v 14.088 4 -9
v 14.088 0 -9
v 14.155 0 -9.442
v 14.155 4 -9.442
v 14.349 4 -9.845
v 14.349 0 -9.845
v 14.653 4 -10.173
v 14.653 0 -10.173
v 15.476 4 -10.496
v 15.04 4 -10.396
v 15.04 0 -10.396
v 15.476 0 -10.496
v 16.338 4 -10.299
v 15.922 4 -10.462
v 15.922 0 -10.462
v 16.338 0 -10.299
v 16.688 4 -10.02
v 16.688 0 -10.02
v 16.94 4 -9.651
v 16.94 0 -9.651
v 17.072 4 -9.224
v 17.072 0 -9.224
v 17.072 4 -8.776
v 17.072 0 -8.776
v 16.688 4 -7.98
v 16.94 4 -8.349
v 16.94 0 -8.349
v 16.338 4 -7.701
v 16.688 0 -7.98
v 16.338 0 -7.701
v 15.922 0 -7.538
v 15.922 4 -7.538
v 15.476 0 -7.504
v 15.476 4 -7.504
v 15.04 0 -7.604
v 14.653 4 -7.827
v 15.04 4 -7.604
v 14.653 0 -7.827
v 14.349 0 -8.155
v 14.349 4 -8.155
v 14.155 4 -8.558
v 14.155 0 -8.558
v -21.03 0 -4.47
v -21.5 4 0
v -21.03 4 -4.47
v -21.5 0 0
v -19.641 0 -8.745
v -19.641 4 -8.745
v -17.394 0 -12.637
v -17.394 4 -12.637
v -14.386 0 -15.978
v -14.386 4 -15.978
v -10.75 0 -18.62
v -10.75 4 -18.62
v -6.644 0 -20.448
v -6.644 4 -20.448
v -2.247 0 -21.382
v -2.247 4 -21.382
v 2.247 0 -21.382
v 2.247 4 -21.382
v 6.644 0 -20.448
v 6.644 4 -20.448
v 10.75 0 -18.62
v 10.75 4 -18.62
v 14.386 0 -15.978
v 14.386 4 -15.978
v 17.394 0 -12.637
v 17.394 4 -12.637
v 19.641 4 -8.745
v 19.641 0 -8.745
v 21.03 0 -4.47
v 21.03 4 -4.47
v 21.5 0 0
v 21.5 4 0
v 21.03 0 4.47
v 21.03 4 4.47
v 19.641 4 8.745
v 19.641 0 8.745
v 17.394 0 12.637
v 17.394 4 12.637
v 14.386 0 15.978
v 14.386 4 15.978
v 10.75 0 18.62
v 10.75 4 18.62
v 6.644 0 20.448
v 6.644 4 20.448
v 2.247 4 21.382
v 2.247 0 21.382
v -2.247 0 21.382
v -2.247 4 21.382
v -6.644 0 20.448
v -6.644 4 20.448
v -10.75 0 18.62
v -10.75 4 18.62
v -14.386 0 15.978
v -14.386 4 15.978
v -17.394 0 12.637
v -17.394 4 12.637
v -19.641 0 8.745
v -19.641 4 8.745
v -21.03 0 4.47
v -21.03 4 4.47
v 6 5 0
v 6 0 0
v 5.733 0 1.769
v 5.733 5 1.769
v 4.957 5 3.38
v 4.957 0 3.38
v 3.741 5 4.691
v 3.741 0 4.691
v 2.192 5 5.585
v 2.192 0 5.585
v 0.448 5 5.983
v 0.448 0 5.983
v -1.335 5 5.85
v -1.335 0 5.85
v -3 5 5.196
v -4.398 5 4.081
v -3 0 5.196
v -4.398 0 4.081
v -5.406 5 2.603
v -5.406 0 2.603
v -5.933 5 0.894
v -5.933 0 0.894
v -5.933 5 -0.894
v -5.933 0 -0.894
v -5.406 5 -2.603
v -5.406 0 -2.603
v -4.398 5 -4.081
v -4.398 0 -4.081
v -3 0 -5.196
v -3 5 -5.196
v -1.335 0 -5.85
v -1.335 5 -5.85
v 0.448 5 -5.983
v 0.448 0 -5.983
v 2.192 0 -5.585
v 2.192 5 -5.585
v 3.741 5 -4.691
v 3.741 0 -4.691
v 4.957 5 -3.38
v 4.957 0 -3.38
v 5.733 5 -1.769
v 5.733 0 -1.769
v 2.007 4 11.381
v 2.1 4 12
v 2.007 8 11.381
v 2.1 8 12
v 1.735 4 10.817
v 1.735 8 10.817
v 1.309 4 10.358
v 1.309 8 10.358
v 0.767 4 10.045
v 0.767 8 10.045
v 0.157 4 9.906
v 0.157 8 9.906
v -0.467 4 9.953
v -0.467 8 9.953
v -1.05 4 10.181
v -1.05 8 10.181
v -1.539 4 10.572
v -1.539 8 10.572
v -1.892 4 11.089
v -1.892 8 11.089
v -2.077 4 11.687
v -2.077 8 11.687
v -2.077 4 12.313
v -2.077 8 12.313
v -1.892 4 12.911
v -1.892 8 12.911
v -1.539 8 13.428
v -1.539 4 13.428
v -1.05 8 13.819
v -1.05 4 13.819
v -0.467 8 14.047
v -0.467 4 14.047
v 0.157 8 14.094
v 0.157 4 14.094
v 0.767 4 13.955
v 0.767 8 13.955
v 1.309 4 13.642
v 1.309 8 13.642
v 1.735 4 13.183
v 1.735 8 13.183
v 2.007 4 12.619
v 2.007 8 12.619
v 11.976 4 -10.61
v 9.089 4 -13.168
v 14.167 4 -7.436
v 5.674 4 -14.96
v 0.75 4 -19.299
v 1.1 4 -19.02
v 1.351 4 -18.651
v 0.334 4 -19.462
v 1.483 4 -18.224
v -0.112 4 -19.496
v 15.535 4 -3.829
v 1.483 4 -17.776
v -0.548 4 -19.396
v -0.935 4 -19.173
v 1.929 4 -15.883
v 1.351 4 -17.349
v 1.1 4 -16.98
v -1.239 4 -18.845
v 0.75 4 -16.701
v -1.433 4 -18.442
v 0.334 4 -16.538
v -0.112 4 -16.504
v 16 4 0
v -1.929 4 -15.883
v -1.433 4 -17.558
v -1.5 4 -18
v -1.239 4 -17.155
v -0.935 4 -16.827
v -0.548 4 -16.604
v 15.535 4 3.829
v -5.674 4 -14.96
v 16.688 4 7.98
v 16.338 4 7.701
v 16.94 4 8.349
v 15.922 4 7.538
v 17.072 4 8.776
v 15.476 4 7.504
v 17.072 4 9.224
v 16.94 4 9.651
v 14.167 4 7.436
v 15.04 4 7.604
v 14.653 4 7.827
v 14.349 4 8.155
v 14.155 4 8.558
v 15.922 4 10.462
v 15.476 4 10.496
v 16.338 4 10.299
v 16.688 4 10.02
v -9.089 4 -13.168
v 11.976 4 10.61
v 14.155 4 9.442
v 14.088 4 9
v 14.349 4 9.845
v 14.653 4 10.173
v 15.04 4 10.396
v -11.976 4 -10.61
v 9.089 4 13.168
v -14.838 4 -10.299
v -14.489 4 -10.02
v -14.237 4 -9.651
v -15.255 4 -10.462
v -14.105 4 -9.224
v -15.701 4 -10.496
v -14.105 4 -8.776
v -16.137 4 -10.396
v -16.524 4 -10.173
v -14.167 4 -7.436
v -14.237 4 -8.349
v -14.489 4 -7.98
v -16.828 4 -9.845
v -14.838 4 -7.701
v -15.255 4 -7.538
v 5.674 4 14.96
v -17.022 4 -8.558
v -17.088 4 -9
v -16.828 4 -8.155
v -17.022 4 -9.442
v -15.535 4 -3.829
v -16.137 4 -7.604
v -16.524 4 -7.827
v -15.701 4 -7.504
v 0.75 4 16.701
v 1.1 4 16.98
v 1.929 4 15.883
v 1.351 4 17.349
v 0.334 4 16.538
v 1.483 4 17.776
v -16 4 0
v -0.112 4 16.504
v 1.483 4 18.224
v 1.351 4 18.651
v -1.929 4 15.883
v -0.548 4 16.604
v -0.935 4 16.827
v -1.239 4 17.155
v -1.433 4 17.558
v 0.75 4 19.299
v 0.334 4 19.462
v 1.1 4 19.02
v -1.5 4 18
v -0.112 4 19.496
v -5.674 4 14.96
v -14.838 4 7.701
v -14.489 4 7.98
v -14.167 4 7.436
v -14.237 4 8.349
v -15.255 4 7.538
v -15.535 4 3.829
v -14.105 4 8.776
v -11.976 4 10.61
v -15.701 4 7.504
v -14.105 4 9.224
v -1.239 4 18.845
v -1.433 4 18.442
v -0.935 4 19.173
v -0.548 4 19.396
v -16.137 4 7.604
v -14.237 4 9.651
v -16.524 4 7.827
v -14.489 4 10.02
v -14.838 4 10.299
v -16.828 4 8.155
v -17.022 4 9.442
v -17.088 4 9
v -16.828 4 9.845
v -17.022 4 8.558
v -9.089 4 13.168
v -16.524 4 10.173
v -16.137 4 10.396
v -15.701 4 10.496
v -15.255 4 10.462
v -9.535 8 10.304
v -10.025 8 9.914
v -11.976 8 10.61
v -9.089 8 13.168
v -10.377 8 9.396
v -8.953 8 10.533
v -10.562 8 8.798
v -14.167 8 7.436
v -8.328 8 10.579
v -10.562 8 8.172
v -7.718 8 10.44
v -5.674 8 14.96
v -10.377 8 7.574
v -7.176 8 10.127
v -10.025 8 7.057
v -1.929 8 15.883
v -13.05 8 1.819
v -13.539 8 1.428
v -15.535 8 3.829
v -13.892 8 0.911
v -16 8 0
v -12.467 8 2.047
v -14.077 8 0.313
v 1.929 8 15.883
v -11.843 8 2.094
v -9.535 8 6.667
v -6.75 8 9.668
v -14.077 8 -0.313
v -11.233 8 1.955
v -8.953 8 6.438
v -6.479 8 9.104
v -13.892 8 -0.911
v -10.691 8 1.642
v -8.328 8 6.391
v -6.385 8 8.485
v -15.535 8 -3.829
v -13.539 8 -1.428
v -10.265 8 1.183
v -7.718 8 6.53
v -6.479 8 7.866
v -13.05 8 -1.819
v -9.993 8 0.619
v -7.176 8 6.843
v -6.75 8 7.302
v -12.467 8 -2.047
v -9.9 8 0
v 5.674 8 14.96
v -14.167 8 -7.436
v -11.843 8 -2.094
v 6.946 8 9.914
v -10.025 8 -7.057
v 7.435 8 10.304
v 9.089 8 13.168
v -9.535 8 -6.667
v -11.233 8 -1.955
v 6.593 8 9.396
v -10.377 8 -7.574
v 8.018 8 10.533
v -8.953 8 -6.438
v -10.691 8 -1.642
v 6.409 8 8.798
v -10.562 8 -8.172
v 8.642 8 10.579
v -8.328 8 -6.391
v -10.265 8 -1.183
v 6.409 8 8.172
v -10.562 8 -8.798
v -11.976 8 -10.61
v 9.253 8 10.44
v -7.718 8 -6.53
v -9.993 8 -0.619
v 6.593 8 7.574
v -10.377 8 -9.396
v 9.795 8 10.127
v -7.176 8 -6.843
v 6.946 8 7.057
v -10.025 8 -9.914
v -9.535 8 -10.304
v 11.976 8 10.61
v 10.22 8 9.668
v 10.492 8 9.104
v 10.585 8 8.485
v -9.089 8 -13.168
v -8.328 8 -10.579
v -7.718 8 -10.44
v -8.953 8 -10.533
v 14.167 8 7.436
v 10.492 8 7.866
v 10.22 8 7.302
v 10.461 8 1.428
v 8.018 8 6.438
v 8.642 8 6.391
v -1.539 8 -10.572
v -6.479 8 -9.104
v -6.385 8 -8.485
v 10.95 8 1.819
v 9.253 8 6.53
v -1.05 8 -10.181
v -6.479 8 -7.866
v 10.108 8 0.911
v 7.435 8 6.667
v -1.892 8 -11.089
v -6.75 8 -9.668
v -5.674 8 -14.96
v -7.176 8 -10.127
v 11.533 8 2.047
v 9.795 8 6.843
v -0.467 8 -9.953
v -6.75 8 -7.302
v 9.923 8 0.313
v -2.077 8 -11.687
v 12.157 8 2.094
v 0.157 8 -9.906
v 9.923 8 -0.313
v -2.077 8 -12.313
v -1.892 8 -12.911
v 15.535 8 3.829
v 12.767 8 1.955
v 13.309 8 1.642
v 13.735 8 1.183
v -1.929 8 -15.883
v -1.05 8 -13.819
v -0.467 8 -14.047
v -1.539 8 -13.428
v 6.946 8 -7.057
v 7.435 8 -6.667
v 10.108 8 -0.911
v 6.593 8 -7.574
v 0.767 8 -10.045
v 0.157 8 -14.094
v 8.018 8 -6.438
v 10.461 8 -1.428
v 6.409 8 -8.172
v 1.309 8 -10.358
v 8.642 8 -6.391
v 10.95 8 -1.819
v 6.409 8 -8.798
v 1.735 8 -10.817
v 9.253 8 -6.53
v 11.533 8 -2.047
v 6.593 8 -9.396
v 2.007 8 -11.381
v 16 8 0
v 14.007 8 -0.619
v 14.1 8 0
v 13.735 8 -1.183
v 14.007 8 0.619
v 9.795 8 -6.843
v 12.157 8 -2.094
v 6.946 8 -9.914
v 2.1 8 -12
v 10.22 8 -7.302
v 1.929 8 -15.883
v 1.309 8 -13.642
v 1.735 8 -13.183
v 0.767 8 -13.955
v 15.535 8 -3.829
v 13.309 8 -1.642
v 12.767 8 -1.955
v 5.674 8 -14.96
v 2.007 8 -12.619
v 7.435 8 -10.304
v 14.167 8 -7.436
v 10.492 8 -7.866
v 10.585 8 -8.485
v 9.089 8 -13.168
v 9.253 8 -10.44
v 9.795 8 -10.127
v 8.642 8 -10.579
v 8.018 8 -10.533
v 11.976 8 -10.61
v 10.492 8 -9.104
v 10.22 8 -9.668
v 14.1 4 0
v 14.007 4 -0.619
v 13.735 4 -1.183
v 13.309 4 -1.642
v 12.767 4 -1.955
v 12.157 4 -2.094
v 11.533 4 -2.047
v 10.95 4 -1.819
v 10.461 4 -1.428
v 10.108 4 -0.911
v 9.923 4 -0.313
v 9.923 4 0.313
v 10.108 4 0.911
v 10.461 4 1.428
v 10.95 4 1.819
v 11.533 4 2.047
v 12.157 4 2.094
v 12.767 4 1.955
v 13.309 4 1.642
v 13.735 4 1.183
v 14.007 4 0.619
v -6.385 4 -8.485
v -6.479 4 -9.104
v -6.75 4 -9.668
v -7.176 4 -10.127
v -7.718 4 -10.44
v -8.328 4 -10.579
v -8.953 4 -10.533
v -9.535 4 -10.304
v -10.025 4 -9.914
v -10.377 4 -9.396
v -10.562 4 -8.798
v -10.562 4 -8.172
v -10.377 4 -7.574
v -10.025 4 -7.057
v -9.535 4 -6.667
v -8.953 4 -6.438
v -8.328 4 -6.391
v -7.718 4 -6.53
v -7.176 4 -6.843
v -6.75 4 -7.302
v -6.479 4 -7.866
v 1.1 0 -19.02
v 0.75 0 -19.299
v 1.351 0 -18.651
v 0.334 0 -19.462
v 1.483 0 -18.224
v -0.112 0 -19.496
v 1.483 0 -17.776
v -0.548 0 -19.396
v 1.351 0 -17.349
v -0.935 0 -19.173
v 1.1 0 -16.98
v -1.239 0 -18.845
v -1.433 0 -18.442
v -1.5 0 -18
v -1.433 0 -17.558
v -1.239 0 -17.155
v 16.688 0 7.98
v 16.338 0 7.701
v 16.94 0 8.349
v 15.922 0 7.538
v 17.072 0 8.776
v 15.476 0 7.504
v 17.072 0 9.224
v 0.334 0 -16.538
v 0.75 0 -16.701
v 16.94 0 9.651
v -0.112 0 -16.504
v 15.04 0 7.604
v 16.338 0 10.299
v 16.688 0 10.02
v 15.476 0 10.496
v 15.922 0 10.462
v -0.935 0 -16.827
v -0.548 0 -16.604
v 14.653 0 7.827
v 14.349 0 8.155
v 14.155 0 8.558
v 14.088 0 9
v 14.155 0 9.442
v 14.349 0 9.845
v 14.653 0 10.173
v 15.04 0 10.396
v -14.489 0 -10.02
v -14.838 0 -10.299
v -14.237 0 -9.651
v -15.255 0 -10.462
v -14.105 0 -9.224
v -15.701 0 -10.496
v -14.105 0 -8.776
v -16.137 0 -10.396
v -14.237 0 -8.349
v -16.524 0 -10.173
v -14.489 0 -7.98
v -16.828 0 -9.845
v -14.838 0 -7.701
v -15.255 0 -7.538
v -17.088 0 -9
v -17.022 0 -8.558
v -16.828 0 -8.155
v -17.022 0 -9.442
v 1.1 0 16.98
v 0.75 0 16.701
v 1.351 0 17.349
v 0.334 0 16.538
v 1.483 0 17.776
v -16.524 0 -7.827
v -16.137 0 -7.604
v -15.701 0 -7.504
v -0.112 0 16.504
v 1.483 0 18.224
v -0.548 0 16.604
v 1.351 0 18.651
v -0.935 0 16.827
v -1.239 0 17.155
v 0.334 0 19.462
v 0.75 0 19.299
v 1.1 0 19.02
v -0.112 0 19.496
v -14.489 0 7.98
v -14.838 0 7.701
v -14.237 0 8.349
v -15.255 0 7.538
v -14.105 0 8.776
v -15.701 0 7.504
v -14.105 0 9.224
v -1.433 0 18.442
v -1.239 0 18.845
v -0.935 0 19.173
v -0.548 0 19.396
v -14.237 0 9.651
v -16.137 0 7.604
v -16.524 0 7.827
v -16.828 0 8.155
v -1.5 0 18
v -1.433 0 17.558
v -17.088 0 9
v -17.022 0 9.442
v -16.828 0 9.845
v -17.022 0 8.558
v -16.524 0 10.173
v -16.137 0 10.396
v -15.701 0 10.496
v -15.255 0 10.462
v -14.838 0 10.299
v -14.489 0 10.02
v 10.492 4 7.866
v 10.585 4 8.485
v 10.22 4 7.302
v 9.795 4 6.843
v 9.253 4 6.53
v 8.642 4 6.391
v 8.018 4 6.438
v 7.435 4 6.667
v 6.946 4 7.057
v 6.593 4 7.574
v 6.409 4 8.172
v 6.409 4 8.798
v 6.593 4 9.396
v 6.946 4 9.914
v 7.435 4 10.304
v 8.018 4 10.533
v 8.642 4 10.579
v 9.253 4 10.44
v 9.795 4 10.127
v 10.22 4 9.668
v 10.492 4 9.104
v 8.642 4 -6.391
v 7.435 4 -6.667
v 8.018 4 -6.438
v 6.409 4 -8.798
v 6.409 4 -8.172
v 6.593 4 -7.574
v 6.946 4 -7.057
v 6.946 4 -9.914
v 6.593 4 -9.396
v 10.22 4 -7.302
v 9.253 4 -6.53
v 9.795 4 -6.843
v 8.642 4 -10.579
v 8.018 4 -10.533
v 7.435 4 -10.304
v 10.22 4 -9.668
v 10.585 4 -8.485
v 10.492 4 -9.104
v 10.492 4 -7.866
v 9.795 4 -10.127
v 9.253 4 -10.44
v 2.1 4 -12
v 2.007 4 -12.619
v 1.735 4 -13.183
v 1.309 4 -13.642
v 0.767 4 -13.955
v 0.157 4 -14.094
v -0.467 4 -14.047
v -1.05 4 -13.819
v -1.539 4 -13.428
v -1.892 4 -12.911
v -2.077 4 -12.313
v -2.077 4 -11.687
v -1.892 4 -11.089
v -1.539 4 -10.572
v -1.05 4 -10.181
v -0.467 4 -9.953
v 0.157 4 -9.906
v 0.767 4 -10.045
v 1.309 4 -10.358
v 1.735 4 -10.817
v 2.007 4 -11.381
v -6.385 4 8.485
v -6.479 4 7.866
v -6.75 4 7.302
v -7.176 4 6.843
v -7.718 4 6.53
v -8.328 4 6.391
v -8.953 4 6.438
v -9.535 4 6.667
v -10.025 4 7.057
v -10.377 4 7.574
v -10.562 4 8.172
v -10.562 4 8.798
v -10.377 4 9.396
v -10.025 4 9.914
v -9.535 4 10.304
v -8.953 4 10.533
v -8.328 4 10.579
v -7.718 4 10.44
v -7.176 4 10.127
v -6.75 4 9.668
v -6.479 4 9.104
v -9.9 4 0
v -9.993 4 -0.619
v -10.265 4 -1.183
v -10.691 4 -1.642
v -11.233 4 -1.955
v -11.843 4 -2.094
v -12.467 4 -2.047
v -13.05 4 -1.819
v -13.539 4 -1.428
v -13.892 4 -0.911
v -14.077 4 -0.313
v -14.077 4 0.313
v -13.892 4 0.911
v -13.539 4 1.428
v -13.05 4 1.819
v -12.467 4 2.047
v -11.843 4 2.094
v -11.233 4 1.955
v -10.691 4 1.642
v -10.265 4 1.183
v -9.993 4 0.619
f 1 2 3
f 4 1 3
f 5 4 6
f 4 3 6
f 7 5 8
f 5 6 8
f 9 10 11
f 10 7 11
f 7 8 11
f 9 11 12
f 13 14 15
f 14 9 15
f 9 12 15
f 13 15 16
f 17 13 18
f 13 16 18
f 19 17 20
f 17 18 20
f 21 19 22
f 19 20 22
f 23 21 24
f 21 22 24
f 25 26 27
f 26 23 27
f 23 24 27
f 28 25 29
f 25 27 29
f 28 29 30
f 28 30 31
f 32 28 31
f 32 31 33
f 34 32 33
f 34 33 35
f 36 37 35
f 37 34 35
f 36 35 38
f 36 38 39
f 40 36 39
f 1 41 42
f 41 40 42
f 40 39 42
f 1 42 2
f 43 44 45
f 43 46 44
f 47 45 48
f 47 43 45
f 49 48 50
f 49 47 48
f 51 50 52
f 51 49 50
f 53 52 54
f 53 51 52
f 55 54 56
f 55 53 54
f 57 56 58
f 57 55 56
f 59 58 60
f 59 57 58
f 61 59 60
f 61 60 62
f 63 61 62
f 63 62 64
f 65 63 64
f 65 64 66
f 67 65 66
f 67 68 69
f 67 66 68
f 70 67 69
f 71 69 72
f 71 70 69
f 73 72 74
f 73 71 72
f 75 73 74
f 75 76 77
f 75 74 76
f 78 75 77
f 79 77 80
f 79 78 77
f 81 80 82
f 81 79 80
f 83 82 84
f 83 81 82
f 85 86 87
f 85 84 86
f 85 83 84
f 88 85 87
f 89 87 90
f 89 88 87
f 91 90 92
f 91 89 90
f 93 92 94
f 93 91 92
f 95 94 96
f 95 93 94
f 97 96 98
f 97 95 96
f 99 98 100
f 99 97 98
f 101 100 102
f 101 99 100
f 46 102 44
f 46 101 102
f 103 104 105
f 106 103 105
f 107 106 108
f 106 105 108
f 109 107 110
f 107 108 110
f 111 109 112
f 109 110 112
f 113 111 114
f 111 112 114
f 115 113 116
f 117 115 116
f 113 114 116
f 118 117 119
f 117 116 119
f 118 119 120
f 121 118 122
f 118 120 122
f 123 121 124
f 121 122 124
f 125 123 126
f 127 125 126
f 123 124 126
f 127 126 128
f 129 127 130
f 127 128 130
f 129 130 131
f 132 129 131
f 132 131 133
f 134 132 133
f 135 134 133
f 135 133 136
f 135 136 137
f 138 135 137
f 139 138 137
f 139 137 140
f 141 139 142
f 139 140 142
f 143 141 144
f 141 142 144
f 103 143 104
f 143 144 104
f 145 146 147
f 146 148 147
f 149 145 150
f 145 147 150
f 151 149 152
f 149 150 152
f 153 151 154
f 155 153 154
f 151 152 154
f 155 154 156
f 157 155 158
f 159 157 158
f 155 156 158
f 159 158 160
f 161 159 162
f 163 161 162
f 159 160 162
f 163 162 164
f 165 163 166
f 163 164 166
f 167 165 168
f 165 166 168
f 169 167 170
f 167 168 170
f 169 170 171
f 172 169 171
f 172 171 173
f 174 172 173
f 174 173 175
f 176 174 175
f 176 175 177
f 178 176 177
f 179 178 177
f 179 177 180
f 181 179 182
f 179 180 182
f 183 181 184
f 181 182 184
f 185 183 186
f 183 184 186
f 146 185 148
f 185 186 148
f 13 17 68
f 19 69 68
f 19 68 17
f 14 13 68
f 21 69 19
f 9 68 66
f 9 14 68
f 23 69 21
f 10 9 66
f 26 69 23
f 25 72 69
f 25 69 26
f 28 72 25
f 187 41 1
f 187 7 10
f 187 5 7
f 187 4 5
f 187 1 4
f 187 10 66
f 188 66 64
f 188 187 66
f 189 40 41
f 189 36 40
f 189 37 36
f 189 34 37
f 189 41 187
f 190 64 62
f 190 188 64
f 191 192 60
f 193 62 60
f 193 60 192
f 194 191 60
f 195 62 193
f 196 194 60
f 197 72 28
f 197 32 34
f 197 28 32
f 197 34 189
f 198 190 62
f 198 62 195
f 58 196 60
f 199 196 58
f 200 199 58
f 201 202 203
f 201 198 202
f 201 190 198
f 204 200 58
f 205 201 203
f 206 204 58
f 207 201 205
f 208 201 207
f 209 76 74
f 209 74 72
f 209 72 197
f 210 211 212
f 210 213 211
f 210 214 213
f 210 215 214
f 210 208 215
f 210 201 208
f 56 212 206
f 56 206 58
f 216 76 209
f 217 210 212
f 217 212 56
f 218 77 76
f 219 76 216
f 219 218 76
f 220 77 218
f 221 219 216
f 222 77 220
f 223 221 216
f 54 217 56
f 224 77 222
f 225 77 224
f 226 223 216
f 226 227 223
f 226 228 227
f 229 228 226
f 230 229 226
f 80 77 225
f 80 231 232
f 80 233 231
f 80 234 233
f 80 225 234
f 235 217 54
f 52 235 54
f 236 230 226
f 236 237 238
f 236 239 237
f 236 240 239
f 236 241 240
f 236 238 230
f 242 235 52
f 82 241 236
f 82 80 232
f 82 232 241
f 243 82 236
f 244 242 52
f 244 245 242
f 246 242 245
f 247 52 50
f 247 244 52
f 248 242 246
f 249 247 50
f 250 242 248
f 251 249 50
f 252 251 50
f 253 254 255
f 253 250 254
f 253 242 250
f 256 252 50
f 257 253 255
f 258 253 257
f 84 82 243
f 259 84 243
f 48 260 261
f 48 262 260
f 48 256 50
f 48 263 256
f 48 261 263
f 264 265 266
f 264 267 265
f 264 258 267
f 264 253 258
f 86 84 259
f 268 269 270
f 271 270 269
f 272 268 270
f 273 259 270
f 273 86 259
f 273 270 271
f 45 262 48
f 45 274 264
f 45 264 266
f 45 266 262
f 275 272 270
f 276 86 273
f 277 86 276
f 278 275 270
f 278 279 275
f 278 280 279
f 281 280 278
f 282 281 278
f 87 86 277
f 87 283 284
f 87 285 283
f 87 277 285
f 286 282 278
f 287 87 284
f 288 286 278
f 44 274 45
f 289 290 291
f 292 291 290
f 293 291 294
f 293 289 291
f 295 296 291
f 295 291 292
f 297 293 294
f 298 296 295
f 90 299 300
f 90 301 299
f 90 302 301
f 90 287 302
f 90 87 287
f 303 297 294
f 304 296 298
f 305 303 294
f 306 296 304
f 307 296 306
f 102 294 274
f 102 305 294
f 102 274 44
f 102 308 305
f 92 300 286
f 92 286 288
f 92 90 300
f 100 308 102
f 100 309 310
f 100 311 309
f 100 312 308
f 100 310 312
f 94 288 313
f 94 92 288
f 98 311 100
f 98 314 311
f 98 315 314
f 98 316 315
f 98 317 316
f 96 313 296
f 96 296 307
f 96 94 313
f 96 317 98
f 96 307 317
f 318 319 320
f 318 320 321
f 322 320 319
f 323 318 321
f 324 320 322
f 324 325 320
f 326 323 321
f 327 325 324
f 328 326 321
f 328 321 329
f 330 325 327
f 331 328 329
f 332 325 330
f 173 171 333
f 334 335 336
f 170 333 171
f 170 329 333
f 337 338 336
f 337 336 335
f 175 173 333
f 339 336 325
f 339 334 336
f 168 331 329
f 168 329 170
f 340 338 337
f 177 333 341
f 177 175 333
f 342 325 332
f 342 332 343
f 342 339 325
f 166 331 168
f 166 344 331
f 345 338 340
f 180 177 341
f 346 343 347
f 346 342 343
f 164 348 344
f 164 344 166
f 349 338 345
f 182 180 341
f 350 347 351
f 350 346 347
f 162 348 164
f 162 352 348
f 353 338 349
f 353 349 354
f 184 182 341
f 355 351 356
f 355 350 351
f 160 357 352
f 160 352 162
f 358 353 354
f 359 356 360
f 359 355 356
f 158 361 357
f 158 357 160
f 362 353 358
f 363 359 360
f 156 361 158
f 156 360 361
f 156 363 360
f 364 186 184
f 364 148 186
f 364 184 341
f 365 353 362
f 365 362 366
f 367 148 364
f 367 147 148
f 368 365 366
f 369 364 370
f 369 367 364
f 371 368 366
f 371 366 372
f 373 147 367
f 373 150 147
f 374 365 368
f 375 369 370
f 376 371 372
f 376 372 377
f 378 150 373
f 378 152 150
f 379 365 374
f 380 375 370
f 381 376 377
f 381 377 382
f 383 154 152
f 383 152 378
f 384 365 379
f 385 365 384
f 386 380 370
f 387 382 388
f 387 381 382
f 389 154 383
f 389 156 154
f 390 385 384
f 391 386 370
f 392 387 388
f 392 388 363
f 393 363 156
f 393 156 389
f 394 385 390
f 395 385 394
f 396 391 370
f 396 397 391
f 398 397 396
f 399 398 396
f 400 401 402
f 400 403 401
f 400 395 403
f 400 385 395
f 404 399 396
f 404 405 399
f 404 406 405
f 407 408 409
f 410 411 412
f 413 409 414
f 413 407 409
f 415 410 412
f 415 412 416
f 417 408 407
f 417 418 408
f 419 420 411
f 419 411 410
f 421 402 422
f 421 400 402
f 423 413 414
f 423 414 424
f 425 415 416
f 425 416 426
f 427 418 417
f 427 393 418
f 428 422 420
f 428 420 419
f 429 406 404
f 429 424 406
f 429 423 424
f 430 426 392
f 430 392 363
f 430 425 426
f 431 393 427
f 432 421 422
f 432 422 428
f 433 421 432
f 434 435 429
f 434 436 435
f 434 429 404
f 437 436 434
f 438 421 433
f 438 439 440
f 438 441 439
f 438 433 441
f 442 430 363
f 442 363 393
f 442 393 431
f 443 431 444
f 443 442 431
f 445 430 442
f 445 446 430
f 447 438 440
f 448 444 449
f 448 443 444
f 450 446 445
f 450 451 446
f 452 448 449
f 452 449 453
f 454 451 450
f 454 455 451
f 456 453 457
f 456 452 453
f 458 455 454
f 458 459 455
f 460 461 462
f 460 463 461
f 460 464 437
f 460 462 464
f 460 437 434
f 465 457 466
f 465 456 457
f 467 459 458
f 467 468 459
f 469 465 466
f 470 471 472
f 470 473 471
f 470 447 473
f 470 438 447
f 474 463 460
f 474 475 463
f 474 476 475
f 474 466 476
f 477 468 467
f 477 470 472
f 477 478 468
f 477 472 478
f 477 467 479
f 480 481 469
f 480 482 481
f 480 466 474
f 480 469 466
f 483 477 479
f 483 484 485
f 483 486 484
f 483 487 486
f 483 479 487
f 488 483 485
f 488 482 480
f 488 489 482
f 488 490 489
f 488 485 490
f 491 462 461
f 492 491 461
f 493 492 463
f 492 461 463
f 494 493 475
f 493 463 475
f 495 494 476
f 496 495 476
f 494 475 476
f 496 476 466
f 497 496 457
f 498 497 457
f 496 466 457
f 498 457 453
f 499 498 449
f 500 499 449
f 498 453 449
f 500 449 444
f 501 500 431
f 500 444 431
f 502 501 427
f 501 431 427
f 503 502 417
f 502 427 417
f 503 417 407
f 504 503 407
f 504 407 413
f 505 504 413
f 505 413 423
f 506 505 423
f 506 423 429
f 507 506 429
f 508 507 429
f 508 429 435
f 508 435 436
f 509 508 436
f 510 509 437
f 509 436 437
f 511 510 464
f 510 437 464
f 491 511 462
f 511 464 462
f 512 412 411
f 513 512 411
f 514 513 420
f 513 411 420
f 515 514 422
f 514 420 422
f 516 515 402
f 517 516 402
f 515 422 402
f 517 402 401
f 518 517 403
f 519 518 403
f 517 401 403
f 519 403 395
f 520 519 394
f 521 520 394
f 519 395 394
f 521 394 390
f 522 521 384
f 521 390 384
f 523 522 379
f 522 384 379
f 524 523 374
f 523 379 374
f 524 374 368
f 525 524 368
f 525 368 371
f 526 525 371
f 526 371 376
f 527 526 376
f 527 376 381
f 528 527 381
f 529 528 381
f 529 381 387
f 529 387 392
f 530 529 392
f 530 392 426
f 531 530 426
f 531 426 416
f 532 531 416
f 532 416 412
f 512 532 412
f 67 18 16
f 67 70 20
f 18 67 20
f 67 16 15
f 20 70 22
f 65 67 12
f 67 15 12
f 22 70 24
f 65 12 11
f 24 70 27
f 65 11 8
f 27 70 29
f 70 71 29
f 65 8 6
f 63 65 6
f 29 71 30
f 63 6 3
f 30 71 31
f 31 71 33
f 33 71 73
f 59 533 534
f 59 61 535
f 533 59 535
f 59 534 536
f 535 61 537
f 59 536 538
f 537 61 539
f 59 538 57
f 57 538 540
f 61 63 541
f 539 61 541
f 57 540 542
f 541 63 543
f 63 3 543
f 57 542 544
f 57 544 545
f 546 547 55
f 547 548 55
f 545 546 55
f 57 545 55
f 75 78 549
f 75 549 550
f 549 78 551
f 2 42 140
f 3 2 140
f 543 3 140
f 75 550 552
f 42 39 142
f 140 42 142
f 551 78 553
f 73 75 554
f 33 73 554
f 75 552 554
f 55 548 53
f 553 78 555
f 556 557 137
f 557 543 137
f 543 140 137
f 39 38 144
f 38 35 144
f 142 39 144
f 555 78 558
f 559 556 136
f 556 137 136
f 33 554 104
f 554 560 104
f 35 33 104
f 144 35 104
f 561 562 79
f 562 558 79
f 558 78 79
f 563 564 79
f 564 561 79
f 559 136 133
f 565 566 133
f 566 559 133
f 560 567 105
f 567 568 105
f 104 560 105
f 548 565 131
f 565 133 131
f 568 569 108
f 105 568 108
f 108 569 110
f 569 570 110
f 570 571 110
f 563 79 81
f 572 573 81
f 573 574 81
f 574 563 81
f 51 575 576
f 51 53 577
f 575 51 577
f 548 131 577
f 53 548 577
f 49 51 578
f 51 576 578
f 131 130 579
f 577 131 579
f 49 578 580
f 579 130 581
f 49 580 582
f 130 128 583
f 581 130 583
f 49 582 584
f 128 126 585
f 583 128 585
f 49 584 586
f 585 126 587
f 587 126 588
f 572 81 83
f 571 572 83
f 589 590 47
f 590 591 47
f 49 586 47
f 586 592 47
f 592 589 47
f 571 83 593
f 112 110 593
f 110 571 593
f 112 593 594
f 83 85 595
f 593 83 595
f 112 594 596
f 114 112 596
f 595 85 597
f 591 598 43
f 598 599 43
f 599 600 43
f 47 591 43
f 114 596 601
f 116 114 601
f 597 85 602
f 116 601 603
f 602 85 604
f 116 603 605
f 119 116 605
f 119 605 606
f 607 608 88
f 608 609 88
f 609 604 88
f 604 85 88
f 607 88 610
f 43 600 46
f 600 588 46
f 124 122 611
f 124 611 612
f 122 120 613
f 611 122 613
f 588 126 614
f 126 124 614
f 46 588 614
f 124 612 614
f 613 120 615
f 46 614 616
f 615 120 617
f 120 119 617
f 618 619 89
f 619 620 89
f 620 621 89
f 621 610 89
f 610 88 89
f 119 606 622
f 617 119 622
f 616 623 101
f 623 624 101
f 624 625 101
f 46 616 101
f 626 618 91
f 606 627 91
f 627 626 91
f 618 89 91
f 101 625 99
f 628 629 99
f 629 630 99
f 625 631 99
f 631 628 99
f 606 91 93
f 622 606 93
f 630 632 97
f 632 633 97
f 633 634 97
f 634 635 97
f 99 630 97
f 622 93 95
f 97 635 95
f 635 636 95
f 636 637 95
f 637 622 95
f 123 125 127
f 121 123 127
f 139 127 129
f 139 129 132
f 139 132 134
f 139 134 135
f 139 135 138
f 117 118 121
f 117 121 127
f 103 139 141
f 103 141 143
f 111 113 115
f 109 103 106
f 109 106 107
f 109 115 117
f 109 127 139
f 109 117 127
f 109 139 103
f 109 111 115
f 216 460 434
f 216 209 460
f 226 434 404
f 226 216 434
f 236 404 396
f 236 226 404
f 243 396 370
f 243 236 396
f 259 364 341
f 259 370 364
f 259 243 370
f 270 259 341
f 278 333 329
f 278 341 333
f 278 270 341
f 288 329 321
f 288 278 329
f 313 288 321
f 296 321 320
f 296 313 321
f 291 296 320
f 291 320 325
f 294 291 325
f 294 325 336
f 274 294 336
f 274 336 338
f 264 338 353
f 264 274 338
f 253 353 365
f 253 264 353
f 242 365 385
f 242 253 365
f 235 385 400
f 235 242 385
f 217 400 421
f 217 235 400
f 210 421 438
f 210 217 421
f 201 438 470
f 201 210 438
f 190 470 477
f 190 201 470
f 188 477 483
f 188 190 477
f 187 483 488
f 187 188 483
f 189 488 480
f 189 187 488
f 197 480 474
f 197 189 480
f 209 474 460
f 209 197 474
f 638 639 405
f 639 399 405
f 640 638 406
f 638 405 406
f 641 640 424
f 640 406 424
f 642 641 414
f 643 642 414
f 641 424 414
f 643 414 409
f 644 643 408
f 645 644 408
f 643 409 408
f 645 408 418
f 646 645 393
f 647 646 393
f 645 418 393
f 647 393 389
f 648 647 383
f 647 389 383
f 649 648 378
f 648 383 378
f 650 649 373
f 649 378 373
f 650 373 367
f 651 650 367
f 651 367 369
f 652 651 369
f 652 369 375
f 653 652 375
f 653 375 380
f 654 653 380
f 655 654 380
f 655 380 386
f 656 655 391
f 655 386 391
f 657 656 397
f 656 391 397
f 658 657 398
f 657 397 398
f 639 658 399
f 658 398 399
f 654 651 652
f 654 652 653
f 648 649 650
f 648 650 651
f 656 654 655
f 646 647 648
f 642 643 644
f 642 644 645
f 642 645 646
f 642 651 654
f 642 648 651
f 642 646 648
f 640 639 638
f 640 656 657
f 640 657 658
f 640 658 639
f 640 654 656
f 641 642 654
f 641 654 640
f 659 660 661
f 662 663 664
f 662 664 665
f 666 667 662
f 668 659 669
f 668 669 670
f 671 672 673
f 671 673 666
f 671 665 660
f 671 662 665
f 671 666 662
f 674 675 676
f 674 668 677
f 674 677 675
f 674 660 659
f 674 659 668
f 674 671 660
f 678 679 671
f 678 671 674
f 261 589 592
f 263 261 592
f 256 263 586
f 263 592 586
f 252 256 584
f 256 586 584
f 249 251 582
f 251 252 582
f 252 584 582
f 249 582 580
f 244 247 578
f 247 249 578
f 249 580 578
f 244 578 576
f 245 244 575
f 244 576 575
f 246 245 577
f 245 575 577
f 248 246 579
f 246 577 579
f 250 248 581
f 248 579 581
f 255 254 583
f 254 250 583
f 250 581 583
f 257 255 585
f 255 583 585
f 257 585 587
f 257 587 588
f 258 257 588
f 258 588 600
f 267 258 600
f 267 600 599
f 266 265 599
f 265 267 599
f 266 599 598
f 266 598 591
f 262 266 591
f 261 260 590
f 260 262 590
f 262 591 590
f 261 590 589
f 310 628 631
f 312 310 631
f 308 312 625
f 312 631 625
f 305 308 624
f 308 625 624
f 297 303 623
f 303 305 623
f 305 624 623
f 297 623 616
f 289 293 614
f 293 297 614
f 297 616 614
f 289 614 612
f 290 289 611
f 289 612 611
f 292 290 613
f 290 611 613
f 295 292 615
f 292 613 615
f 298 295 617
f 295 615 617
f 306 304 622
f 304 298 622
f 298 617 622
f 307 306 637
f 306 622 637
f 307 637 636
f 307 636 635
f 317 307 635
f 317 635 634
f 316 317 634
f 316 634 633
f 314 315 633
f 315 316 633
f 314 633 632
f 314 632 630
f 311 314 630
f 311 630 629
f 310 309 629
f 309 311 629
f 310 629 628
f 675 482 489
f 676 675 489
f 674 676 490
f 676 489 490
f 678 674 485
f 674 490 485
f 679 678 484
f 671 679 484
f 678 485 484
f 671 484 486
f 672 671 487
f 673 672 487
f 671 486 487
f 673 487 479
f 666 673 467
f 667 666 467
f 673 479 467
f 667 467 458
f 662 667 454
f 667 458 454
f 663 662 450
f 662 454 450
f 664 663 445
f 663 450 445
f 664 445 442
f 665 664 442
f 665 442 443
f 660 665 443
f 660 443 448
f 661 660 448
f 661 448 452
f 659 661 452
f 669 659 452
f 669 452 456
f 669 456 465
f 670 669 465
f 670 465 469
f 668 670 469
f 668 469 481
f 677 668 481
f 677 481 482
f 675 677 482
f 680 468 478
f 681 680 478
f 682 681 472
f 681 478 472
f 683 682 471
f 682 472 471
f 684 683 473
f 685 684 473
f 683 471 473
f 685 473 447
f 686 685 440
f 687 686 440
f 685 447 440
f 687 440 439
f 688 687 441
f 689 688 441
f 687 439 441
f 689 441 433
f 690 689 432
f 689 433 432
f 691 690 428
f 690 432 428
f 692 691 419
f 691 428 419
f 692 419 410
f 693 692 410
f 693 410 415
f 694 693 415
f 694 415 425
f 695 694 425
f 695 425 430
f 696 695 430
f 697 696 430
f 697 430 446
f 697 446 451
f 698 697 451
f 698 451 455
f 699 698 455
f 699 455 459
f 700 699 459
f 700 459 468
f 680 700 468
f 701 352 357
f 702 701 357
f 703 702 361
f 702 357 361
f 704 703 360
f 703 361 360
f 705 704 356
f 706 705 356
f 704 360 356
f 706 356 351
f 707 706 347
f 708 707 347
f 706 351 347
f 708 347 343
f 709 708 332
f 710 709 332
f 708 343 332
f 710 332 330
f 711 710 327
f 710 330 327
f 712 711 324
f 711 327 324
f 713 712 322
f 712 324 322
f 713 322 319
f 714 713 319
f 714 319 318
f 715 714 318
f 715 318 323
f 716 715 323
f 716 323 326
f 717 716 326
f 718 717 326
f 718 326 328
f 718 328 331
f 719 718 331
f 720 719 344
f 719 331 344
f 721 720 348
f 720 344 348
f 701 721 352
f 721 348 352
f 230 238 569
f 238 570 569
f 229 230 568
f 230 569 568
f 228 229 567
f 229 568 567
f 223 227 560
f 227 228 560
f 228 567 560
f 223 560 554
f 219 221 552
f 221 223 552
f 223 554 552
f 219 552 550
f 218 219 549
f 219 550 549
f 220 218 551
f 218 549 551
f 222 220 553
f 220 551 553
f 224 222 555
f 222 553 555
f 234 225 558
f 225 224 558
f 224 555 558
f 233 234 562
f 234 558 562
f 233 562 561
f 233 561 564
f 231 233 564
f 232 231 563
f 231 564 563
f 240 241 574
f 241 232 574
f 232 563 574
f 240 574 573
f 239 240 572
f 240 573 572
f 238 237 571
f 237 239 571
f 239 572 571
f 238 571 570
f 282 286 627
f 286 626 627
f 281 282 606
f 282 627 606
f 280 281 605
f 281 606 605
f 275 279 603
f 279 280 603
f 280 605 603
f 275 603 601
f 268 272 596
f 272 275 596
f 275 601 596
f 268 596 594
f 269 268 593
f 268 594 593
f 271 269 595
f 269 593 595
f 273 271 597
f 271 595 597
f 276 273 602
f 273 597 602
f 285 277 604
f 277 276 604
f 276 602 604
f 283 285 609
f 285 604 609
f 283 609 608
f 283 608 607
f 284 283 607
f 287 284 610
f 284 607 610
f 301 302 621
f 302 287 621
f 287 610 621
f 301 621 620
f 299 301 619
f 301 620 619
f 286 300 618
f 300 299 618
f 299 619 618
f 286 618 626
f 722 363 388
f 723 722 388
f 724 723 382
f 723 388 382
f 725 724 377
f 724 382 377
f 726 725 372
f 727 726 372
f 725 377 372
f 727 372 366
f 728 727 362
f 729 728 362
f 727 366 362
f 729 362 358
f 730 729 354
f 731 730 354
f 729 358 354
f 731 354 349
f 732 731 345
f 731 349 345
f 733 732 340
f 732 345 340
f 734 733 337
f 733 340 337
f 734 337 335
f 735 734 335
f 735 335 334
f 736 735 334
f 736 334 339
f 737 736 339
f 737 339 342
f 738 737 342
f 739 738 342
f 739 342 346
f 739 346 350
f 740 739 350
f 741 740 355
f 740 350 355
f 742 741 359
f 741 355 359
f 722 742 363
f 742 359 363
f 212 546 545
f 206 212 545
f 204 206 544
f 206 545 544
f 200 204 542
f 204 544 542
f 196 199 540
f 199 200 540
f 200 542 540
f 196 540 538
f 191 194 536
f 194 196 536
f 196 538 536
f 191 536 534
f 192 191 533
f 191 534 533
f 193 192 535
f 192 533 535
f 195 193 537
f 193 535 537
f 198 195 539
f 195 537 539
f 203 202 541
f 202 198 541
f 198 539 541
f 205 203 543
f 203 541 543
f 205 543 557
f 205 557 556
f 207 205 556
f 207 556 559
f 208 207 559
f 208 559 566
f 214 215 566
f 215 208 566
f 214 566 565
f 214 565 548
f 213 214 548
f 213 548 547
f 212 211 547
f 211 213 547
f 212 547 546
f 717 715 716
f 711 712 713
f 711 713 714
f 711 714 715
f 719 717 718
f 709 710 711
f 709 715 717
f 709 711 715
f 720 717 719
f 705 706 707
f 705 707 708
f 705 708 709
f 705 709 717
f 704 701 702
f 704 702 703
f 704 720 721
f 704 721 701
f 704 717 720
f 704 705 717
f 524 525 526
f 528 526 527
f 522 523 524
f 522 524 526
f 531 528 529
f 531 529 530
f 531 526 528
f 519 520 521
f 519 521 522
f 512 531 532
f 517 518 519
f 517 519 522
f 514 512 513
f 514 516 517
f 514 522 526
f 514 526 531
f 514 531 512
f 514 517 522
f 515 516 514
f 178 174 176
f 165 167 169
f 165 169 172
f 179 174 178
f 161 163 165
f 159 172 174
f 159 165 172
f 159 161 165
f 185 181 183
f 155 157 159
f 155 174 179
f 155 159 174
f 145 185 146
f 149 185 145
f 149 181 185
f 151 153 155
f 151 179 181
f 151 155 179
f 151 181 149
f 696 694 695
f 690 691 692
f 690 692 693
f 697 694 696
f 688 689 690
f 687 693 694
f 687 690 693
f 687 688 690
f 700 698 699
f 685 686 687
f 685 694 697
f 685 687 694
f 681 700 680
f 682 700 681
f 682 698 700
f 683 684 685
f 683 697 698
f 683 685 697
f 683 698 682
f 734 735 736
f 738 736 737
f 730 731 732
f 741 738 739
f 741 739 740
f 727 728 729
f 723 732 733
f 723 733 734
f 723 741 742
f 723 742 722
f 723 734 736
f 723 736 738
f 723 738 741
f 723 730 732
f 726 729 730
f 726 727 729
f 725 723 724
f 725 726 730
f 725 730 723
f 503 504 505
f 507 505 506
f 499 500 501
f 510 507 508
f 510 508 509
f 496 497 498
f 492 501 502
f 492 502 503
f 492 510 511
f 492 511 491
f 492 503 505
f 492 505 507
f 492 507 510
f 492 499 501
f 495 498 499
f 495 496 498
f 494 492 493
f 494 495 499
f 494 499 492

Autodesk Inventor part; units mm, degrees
ref_plane "YZ Plane" through (0, 0, 0) normal (1, 0, 0) x (0, 1, 0)
ref_plane "XZ Plane" through (0, 0, 0) normal (0, 1, 0) x (-1, 0, 0)
ref_plane "XY Plane" through (0, 0, 0) normal (0, 0, 1) x (1, 0, 0)
sketch "Sketch1" plane through (0, 0, 0) normal (0, 1, 0) x (-1, 0, 0)
  circle A0 centre (0, 0) radius 21.5
  circle A1 centre (0, -18) radius 1.5
  circle A2 centre (15.5885, -9) radius 1.5
  circle A3 centre (15.5885, 9) radius 1.5
  circle A4 centre (0, 18) radius 1.5
  circle A5 centre (-15.5885, 9) radius 1.5
  circle A6 centre (-15.5885, -9) radius 1.5
  dimension "d0" = 43
  dimension "d1" = 3
  dimension "d2" = 18
  dimension "d5" = 360
extrude "Extrusion1" add sketch "Sketch1" along normal blind 4
sketch "Sketch2" plane through (0, 4, 0) normal (0, 1, 0) x (1, 0, 0)
  circle A0 centre (0, 0) radius 16
  dimension "d9" = 32
extrude "Extrusion2" add sketch "Sketch2" along normal blind 4
sketch "Sketch3" plane through (0, 8, 0) normal (0, 1, 0) x (1, 0, 0)
  circle A0 centre (0, 12) radius 2.1
  circle A1 centre (-8.4853, 8.4853) radius 2.1
  circle A2 centre (-12, 0) radius 2.1
  circle A3 centre (-8.4853, -8.4853) radius 2.1
  circle A4 centre (0, -12) radius 2.1
  circle A5 centre (8.4853, -8.4853) radius 2.1
  circle A6 centre (12, 0) radius 2.1
  circle A7 centre (8.4853, 8.4853) radius 2.1
  point P0 (0, 0)
  dimension "d27" = 4.2
  dimension "d32" = 360
  dimension "d44" = 12
extrude "Extrusion3" cut sketch "Sketch3" against normal blind 4
thread "Thread7" size "M4x0.7" class "6H" standard "ANSI Metric M Profile" full length
thread "Thread8" size "M4x0.7" class "6H" standard "ANSI Metric M Profile" full length
thread "Thread9" size "M4x0.7" class "6H" standard "ANSI Metric M Profile" full length
thread "Thread10" size "M4x0.7" class "6H" standard "ANSI Metric M Profile" full length
thread "Thread11" size "M4x0.7" class "6H" standard "ANSI Metric M Profile" full length
thread "Thread12" size "M4x0.7" class "6H" standard "ANSI Metric M Profile" full length
thread "Thread13" size "M4x0.7" class "6H" standard "ANSI Metric M Profile" full length
thread "Thread14" size "M4x0.7" class "6H" standard "ANSI Metric M Profile" full length
thread "Thread15" size "M3x0.5" class "6H" standard "ANSI Metric M Profile" full length
thread "Thread16" size "M3x0.5" class "6H" standard "ANSI Metric M Profile" full length
thread "Thread17" size "M3x0.5" class "6H" standard "ANSI Metric M Profile" full length
thread "Thread18" size "M3x0.5" class "6H" standard "ANSI Metric M Profile" full length
thread "Thread19" size "M3x0.5" class "6H" standard "ANSI Metric M Profile" full length
thread "Thread20" size "M3x0.5" class "6H" standard "ANSI Metric M Profile" full length
sketch "Sketch4" plane through (0, 0, 0) normal (0, -1, 0) x (1, 0, 0)
  circle A0 centre (0, 0) radius 6
  dimension "d65" = 12
extrude "Extrusion4" cut sketch "Sketch4" against normal blind 5
properties part number "OutPutPlate" material "Aluminum 6061"
